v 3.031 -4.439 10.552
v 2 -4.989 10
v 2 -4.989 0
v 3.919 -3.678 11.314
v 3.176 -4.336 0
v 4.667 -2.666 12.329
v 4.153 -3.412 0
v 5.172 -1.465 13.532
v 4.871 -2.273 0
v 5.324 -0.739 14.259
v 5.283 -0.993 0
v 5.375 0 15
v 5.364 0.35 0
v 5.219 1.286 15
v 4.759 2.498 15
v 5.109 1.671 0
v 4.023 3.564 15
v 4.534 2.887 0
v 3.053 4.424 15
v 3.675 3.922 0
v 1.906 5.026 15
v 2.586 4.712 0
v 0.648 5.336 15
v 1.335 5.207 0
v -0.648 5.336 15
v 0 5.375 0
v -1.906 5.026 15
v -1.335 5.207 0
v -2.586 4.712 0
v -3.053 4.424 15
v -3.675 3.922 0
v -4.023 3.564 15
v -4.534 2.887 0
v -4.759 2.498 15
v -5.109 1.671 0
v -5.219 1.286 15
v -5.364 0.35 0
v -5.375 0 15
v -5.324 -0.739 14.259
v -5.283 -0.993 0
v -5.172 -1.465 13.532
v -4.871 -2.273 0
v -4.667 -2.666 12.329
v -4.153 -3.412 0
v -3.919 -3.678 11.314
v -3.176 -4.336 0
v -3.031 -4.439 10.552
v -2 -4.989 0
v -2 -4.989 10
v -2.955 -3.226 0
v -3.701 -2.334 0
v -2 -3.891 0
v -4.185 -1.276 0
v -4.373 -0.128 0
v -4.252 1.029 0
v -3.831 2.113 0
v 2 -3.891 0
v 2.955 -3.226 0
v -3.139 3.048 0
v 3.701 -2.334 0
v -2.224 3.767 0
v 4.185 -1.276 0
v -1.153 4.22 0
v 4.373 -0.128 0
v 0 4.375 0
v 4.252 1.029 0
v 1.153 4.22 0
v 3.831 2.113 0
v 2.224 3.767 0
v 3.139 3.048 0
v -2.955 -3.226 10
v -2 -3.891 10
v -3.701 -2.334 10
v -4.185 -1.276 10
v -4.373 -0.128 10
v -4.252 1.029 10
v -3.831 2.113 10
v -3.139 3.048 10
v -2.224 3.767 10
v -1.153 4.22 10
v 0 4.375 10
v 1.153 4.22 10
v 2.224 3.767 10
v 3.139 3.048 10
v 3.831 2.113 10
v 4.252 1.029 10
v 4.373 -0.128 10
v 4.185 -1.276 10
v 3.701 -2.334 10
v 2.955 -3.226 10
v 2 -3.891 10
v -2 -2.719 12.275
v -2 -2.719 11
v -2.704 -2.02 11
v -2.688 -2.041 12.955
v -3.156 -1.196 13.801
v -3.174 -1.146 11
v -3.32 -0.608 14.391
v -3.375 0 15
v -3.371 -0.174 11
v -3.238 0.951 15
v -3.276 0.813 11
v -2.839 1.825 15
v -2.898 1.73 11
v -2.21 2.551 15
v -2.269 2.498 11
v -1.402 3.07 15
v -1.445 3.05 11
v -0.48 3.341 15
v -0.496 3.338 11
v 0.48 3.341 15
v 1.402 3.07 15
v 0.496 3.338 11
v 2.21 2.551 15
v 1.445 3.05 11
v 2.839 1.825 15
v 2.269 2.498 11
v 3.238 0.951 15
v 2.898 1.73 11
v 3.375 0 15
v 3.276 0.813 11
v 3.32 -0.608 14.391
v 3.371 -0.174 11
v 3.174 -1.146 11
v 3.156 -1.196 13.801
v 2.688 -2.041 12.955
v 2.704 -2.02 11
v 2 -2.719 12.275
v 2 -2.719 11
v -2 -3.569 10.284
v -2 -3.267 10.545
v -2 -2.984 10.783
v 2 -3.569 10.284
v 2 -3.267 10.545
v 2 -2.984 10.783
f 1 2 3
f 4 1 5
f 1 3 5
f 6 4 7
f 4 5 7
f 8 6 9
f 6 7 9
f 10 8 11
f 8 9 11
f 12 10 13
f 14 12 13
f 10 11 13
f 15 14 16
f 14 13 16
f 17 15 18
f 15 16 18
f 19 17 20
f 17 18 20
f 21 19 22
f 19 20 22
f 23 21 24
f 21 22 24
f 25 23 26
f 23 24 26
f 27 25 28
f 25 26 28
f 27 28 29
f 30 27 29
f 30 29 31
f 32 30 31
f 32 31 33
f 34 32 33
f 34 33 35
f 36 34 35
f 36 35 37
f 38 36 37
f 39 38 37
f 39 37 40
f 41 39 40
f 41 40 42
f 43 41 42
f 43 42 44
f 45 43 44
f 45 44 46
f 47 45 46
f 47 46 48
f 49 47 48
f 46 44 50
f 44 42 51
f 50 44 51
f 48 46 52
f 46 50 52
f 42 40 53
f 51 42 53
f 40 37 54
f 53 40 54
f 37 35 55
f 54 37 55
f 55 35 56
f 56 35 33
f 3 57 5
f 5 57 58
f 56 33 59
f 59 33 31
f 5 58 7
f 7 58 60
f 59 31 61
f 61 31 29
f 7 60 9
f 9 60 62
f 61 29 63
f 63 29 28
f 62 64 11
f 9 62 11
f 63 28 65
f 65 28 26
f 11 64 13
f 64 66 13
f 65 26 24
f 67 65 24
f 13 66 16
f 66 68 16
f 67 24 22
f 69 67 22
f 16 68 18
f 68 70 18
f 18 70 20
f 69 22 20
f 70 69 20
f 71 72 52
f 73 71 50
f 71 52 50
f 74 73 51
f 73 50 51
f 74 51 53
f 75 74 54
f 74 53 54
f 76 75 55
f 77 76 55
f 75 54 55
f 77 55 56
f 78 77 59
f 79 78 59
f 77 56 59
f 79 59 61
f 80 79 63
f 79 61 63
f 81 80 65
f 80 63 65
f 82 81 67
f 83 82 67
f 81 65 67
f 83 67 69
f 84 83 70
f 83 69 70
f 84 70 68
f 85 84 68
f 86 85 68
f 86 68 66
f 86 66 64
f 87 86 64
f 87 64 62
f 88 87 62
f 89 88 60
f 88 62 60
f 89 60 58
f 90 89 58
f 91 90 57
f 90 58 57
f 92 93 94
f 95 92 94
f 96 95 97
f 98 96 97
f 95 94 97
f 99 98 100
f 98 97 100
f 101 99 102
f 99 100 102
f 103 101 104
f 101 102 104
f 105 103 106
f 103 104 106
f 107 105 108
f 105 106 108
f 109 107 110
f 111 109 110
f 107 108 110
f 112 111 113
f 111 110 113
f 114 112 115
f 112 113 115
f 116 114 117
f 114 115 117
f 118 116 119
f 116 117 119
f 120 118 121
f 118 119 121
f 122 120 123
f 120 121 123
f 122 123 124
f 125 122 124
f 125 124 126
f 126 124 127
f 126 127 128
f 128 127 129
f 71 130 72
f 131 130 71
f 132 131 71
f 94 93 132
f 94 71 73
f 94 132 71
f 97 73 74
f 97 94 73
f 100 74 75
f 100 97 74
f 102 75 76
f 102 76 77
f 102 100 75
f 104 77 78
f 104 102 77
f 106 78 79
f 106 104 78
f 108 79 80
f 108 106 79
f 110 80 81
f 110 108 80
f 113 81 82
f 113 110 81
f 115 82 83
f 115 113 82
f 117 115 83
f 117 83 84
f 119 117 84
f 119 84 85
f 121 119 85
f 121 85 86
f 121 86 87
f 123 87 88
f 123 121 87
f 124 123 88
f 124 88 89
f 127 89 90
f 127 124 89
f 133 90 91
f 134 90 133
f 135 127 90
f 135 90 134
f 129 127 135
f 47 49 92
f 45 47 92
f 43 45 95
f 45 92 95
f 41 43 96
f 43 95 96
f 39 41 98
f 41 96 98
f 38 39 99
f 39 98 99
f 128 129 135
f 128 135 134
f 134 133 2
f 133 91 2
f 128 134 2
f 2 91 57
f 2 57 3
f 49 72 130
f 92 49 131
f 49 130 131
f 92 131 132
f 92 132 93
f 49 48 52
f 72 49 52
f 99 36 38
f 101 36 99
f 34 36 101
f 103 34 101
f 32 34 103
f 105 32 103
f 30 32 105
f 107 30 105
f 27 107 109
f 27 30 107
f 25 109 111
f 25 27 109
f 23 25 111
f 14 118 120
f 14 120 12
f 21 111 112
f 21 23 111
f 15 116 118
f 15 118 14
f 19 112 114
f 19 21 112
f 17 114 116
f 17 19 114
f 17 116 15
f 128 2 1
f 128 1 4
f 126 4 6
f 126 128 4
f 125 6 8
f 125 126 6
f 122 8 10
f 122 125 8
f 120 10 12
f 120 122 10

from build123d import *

# Parameters (mm, degrees)
F1_DEPTH      = 10
F3_DEPTH      = 5
F4_SIZE       = 0.99999
F6_DEPTH      = 25
F6_DEPTH_BACK = 25


# Not quite as in the source:
# - a fillet or chamfer is up to 0.001 mm smaller than in the source, because OpenCascade refuses the exact size


with BuildPart() as f1:
    # F0 (on Top) → F1 (new body)
    with BuildSketch(Plane.XY):
        with BuildLine():
            Line((2, -3.8910956041), (2, -4.9890505109))
            ThreePointArc((2, -4.9890505109), (0, 5.375), (-2, -4.9890505109))
            Line((-2, -4.9890505109), (-2, -3.8910956041))
            ThreePointArc((-2, -3.8910956041), (0, 4.375), (2, -3.8910956041))
        make_face()
    extrude(amount=F1_DEPTH)

    # F2 (on face) → F3 (join)
    with BuildSketch(Plane.XY.offset(10)):
        with BuildLine():
            Line((2, -2.7185703964), (2, -4.9890505109))
            ThreePointArc((2, -4.9890505109), (0, 5.375), (-2, -4.9890505109))
            Line((-2, -4.9890505109), (-2, -2.7185703964))
            ThreePointArc((-2, -2.7185703964), (0, 3.375), (2, -2.7185703964))
        make_face()
    extrude(amount=F3_DEPTH)

    # F4 (size 1 in the source; OpenCascade refuses exactly that, so slightly less here)
    f4_edges = [f1.edges().sort_by_distance(p)[0] for p in [
        (0, 3.375, 10),
    ]]
    chamfer(f4_edges, length=F4_SIZE)

    # F5 (on Right) → F6 (cut, two sides)
    with BuildSketch(Plane.YZ) as f6_sk:
        Polygon((0, 15), (-4.9890505109, 15), (-4.9890505109, 10), align=None)
    extrude(amount=-F6_DEPTH, mode=Mode.SUBTRACT)
    extrude(f6_sk.sketch, amount=F6_DEPTH_BACK, mode=Mode.SUBTRACT)


solid = f1.part
